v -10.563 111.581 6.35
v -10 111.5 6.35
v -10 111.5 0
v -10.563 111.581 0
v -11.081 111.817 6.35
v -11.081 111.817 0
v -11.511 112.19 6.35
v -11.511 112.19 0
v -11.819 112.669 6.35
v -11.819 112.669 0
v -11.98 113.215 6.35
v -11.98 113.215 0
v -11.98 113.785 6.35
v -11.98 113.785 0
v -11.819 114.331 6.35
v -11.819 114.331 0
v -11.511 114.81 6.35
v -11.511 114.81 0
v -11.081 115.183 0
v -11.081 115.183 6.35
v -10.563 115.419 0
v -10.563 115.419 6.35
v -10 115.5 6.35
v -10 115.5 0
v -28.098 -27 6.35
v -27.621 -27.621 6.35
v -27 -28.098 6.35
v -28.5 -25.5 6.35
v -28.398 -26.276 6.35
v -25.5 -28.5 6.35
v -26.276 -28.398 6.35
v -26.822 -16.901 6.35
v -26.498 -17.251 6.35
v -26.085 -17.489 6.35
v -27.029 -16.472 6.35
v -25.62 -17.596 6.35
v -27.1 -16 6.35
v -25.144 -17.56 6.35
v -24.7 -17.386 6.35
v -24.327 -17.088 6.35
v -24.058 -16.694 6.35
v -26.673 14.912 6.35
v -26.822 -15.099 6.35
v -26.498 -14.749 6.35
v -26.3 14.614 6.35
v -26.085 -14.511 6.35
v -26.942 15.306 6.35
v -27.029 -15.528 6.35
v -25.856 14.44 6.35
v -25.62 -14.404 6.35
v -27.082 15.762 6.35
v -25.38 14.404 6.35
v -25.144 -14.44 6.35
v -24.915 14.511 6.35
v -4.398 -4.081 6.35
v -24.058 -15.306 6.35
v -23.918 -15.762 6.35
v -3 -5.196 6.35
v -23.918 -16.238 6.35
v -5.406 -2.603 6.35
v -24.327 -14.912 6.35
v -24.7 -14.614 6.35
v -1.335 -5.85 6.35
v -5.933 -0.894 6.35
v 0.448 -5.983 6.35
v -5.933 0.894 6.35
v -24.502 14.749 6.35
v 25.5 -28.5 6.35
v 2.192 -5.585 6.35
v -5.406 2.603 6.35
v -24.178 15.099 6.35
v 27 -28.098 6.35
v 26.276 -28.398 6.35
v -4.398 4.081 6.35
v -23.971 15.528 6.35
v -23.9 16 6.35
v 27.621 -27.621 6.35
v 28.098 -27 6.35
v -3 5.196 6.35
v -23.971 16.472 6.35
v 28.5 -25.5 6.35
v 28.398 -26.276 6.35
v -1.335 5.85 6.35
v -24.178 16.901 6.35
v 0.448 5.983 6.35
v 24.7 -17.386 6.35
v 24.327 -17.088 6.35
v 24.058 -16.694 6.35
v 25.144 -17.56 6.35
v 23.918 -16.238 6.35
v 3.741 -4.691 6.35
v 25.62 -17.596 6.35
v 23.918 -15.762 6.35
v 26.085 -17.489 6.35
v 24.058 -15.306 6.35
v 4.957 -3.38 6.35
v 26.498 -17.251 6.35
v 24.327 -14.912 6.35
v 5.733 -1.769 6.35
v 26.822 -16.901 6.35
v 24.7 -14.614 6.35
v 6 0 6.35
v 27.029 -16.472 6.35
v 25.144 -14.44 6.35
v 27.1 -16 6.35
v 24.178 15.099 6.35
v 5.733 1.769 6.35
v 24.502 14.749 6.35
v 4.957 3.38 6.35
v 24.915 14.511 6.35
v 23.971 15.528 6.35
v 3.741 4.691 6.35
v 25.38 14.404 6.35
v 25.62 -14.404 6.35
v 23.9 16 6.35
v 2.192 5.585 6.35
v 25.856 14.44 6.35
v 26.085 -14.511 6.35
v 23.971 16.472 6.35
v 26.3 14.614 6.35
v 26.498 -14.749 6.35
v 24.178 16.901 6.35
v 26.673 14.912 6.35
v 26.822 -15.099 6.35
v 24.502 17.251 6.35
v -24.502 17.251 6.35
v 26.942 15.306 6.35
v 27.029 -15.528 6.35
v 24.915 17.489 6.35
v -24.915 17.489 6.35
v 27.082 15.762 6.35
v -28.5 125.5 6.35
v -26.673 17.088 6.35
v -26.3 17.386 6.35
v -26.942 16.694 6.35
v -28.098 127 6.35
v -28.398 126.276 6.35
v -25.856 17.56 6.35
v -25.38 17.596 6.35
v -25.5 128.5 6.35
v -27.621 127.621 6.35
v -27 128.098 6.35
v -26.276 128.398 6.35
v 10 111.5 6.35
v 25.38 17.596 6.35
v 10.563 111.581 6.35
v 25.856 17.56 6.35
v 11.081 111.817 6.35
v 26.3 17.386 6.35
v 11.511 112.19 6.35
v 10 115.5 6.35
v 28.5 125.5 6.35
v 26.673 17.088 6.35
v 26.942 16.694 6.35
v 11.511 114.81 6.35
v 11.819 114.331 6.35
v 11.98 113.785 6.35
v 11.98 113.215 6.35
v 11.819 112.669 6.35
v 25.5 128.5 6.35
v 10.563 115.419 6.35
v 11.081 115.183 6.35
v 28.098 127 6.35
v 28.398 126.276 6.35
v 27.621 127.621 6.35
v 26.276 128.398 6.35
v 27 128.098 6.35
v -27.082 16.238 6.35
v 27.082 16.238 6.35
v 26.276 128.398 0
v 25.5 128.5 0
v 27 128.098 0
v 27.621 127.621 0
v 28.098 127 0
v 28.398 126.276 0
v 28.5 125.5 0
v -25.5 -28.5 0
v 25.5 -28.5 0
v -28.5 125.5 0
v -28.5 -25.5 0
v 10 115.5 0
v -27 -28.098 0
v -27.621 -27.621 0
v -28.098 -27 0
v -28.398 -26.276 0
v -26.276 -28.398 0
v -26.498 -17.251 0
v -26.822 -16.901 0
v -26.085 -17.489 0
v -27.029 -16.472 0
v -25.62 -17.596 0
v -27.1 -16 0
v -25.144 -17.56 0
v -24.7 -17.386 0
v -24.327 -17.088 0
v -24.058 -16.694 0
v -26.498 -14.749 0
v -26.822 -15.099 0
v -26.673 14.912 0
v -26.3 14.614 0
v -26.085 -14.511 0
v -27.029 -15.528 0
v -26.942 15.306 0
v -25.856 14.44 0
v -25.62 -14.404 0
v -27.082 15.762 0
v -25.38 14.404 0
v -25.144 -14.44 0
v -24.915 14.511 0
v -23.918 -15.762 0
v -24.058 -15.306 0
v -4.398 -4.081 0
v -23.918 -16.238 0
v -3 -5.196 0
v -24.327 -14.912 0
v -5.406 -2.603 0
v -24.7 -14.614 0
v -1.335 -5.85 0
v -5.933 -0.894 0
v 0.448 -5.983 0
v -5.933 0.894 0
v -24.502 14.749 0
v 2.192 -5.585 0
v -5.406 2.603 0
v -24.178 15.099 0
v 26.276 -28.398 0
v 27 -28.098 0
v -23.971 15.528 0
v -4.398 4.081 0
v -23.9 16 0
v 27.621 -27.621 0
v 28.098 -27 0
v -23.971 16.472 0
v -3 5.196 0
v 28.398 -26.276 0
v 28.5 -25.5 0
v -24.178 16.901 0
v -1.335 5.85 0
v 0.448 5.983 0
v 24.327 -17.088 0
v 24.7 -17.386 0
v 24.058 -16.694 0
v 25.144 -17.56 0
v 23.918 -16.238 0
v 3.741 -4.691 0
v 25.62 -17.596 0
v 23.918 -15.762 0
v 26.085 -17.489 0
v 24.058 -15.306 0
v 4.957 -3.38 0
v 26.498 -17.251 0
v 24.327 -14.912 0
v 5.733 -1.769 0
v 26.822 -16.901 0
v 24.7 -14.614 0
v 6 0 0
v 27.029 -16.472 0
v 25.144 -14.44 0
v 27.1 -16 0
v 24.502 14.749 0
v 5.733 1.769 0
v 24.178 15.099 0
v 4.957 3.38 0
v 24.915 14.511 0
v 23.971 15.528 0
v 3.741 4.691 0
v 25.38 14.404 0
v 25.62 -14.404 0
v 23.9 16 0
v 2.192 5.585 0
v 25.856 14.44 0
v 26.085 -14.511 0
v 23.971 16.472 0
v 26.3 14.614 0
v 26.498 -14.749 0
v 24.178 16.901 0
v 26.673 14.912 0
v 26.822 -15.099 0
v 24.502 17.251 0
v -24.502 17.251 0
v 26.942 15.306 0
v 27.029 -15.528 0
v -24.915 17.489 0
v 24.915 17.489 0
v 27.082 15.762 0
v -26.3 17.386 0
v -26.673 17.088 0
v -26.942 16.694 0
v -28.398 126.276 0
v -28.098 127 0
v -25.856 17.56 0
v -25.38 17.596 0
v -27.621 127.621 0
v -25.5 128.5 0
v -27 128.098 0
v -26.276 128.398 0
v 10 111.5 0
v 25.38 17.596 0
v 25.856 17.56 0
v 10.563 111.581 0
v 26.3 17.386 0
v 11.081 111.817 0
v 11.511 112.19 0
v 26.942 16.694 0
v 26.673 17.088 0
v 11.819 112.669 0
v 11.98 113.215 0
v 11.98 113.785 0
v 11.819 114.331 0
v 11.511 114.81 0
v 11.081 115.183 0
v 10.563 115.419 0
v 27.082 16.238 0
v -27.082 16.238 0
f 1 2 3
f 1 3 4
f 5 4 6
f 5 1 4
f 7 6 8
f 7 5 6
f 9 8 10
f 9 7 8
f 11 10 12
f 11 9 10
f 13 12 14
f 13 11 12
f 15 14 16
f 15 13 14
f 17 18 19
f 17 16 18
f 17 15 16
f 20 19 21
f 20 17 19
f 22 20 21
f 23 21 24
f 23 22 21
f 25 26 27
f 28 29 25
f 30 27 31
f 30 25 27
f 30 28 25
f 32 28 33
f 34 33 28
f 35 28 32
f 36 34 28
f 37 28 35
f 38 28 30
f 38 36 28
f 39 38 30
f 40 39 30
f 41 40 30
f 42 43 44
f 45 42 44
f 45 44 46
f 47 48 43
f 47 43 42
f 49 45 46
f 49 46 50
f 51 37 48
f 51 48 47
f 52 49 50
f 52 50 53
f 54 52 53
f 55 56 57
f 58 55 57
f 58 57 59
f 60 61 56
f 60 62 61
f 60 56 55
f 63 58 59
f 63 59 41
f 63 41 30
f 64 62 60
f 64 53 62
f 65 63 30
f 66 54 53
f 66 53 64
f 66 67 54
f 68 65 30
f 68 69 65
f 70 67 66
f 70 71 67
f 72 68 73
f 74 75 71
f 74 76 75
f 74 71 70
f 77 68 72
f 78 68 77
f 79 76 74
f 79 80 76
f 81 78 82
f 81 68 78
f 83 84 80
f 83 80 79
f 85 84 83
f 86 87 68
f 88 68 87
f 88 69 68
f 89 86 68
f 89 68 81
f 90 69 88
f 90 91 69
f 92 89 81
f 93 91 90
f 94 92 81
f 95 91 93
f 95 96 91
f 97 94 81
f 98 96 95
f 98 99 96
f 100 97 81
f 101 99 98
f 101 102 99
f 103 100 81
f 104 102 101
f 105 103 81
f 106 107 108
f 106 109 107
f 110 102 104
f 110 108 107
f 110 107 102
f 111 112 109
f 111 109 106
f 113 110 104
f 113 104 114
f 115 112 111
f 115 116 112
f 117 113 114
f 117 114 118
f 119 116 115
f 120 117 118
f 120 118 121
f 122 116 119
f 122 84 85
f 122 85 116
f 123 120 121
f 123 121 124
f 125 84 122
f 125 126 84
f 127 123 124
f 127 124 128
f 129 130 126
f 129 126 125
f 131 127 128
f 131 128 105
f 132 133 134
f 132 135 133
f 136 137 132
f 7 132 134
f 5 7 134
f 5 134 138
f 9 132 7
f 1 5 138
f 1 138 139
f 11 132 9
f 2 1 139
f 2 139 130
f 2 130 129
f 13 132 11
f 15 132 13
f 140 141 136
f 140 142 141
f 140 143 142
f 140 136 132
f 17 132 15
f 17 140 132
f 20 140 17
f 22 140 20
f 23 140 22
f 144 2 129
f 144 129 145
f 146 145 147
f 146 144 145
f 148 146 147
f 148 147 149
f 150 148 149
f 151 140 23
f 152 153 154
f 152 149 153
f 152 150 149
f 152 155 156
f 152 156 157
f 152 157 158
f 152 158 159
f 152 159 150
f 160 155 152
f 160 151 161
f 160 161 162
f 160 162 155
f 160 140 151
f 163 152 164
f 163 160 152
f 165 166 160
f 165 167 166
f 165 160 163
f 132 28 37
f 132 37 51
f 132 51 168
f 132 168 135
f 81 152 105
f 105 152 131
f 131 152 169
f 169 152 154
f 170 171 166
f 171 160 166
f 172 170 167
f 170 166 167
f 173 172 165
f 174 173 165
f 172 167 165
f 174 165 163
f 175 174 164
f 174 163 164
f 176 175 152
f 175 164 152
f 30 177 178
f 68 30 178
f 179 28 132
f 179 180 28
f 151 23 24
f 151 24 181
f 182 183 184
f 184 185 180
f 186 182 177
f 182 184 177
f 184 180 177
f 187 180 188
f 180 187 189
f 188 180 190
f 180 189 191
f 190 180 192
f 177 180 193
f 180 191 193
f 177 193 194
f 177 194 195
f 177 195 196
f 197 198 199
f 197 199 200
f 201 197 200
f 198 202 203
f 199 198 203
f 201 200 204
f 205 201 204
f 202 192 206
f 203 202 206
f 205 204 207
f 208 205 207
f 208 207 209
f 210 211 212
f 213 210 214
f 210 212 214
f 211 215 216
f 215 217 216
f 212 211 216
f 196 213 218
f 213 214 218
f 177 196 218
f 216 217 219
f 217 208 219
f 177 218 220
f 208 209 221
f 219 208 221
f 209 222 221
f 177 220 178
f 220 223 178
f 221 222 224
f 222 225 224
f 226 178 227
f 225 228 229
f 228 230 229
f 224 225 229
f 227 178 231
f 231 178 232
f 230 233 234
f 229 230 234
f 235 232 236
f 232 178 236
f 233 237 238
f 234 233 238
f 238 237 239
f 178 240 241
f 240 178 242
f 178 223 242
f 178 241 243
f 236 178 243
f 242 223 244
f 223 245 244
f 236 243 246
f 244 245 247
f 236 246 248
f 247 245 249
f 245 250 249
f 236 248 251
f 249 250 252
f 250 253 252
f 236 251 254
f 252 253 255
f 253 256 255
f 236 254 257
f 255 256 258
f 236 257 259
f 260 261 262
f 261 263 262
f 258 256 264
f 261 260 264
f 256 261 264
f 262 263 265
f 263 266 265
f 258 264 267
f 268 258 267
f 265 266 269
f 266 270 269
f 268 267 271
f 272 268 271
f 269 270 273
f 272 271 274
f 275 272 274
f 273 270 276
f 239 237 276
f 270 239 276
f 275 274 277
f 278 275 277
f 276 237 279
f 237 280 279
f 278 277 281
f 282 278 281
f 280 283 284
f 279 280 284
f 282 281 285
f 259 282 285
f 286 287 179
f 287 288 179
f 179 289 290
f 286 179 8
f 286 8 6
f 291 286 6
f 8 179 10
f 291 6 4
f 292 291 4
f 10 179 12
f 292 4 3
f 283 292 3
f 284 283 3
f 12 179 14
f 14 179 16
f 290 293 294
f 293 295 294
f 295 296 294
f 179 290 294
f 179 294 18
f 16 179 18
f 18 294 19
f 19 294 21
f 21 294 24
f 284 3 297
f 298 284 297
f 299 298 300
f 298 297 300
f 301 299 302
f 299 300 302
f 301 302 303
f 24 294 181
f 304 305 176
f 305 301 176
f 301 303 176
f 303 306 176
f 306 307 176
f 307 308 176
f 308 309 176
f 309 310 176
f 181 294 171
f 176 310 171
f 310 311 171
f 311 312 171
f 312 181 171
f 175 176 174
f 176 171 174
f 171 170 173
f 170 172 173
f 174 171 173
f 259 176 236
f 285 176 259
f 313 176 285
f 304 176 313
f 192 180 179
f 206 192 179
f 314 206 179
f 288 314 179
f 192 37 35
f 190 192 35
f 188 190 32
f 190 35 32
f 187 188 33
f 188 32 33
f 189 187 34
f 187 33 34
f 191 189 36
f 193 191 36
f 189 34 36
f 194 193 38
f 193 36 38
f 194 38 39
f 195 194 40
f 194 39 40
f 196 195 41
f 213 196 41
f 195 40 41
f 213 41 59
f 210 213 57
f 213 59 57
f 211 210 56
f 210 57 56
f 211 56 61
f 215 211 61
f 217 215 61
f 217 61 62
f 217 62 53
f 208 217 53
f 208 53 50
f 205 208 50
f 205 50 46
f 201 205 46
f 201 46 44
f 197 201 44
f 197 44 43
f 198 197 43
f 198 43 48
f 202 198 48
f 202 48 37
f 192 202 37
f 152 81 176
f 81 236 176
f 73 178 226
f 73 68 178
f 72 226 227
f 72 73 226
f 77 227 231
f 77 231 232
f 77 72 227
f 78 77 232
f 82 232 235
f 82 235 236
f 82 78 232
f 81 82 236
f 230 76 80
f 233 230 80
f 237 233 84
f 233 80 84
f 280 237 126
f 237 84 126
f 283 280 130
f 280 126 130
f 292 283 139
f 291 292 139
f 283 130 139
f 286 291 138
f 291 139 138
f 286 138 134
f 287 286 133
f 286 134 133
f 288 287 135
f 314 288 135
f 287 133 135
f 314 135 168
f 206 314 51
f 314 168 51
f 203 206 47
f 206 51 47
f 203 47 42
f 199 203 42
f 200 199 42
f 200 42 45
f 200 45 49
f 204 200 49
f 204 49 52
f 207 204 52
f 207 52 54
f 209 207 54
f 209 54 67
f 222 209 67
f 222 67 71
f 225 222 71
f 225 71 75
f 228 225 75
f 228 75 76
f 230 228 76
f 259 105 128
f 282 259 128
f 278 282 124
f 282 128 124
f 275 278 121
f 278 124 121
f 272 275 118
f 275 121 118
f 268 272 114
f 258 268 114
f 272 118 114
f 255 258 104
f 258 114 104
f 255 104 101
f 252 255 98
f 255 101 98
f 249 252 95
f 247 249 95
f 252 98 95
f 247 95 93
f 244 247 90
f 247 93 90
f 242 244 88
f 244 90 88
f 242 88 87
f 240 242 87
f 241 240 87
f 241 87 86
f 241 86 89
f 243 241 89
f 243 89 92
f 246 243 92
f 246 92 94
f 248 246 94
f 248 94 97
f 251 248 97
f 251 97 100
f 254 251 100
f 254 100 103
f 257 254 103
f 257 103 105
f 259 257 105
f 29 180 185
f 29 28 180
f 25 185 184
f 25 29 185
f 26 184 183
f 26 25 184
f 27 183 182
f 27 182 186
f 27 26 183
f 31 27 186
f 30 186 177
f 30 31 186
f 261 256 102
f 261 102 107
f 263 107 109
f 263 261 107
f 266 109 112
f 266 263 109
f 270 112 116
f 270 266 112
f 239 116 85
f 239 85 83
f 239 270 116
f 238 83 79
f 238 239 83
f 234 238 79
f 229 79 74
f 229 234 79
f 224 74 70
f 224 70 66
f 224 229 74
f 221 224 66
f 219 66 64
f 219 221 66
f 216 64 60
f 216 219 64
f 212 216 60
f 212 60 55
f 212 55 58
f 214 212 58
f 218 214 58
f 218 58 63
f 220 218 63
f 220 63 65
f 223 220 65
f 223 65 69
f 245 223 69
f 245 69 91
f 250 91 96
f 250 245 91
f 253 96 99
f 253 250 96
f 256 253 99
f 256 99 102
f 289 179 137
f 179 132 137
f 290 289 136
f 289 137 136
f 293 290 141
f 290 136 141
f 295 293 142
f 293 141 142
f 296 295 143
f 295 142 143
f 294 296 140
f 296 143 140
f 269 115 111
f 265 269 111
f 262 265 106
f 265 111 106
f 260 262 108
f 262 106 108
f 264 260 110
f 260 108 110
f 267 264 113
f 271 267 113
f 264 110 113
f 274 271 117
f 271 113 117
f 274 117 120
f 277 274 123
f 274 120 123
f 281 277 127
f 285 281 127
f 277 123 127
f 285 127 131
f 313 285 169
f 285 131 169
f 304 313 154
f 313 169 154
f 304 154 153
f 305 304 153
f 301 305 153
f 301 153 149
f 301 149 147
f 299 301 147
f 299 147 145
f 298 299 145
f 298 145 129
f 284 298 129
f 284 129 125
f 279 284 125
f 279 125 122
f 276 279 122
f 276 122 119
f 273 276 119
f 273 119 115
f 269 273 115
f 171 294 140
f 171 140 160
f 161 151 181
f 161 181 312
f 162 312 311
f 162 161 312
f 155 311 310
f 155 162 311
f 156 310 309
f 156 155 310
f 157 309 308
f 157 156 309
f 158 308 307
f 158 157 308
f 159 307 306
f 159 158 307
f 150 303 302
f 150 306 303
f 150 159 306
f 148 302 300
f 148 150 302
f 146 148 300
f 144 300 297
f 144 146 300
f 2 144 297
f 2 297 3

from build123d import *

# Parameters (mm, degrees)
SKETCH1_W           = 57
SKETCH1_H           = 100
SKETCH1_H_2         = 57
SKETCH1_R           = 6
BOSS_EXTRUDE1_DEPTH = 6.35
CUT_EXTRUDE2_DEPTH  = 132.775652152
FILLET1_R           = 3
SKETCH4_R           = 1.6
CUT_EXTRUDE3_DEPTH  = 132.775652152


with BuildPart() as part:
    # Sketch1 → Boss-Extrude1 (new body)
    # profile 1 of 2: a face of its own
    with BuildSketch(Plane.XY):
        with Locations((0, 78.5)):
            Rectangle(SKETCH1_W, SKETCH1_H)
    # profile 2 of 2: a face of its own
    with BuildSketch(Plane.XY):
        Rectangle(SKETCH1_W, SKETCH1_H_2)
        Circle(SKETCH1_R, mode=Mode.SUBTRACT)
    extrude(amount=BOSS_EXTRUDE1_DEPTH)

    # Sketch3 → Cut-Extrude2 (cut, through all)
    with BuildSketch(Plane.XY.offset(6.35)):
        with BuildLine():
            Line((-10, 115.5), (10, 115.5))
            ThreePointArc((10, 115.5), (12, 113.5), (10, 111.5))
            Line((10, 111.5), (-10, 111.5))
            ThreePointArc((-10, 111.5), (-12, 113.5), (-10, 115.5))
        make_face()
    extrude(amount=-CUT_EXTRUDE2_DEPTH, mode=Mode.SUBTRACT)

    # Fillet1
    fillet1_edges = [part.edges().sort_by_distance(p)[0] for p in [
        (-28.5, 128.5, 3.175),
        (28.5, 128.5, 3.175),
        (28.5, -28.5, 3.175),
        (-28.5, -28.5, 3.175),
    ]]
    fillet(fillet1_edges, radius=FILLET1_R)

    # Sketch4 → Cut-Extrude3 (cut, through all)
    with BuildSketch(Plane.XY.offset(6.35)):
        with Locations((25.5, -16)):
            Circle(SKETCH4_R)
        with Locations(Location((-25.5, -16, 0), (0, 0, 180))):
            Circle(SKETCH4_R)
        with Locations(Location((25.5, 16, 0), (0, 0, 180))):
            Circle(SKETCH4_R)
        with Locations((-25.5, 16)):
            Circle(SKETCH4_R)
    extrude(amount=-CUT_EXTRUDE3_DEPTH, mode=Mode.SUBTRACT)


solid = part.part
